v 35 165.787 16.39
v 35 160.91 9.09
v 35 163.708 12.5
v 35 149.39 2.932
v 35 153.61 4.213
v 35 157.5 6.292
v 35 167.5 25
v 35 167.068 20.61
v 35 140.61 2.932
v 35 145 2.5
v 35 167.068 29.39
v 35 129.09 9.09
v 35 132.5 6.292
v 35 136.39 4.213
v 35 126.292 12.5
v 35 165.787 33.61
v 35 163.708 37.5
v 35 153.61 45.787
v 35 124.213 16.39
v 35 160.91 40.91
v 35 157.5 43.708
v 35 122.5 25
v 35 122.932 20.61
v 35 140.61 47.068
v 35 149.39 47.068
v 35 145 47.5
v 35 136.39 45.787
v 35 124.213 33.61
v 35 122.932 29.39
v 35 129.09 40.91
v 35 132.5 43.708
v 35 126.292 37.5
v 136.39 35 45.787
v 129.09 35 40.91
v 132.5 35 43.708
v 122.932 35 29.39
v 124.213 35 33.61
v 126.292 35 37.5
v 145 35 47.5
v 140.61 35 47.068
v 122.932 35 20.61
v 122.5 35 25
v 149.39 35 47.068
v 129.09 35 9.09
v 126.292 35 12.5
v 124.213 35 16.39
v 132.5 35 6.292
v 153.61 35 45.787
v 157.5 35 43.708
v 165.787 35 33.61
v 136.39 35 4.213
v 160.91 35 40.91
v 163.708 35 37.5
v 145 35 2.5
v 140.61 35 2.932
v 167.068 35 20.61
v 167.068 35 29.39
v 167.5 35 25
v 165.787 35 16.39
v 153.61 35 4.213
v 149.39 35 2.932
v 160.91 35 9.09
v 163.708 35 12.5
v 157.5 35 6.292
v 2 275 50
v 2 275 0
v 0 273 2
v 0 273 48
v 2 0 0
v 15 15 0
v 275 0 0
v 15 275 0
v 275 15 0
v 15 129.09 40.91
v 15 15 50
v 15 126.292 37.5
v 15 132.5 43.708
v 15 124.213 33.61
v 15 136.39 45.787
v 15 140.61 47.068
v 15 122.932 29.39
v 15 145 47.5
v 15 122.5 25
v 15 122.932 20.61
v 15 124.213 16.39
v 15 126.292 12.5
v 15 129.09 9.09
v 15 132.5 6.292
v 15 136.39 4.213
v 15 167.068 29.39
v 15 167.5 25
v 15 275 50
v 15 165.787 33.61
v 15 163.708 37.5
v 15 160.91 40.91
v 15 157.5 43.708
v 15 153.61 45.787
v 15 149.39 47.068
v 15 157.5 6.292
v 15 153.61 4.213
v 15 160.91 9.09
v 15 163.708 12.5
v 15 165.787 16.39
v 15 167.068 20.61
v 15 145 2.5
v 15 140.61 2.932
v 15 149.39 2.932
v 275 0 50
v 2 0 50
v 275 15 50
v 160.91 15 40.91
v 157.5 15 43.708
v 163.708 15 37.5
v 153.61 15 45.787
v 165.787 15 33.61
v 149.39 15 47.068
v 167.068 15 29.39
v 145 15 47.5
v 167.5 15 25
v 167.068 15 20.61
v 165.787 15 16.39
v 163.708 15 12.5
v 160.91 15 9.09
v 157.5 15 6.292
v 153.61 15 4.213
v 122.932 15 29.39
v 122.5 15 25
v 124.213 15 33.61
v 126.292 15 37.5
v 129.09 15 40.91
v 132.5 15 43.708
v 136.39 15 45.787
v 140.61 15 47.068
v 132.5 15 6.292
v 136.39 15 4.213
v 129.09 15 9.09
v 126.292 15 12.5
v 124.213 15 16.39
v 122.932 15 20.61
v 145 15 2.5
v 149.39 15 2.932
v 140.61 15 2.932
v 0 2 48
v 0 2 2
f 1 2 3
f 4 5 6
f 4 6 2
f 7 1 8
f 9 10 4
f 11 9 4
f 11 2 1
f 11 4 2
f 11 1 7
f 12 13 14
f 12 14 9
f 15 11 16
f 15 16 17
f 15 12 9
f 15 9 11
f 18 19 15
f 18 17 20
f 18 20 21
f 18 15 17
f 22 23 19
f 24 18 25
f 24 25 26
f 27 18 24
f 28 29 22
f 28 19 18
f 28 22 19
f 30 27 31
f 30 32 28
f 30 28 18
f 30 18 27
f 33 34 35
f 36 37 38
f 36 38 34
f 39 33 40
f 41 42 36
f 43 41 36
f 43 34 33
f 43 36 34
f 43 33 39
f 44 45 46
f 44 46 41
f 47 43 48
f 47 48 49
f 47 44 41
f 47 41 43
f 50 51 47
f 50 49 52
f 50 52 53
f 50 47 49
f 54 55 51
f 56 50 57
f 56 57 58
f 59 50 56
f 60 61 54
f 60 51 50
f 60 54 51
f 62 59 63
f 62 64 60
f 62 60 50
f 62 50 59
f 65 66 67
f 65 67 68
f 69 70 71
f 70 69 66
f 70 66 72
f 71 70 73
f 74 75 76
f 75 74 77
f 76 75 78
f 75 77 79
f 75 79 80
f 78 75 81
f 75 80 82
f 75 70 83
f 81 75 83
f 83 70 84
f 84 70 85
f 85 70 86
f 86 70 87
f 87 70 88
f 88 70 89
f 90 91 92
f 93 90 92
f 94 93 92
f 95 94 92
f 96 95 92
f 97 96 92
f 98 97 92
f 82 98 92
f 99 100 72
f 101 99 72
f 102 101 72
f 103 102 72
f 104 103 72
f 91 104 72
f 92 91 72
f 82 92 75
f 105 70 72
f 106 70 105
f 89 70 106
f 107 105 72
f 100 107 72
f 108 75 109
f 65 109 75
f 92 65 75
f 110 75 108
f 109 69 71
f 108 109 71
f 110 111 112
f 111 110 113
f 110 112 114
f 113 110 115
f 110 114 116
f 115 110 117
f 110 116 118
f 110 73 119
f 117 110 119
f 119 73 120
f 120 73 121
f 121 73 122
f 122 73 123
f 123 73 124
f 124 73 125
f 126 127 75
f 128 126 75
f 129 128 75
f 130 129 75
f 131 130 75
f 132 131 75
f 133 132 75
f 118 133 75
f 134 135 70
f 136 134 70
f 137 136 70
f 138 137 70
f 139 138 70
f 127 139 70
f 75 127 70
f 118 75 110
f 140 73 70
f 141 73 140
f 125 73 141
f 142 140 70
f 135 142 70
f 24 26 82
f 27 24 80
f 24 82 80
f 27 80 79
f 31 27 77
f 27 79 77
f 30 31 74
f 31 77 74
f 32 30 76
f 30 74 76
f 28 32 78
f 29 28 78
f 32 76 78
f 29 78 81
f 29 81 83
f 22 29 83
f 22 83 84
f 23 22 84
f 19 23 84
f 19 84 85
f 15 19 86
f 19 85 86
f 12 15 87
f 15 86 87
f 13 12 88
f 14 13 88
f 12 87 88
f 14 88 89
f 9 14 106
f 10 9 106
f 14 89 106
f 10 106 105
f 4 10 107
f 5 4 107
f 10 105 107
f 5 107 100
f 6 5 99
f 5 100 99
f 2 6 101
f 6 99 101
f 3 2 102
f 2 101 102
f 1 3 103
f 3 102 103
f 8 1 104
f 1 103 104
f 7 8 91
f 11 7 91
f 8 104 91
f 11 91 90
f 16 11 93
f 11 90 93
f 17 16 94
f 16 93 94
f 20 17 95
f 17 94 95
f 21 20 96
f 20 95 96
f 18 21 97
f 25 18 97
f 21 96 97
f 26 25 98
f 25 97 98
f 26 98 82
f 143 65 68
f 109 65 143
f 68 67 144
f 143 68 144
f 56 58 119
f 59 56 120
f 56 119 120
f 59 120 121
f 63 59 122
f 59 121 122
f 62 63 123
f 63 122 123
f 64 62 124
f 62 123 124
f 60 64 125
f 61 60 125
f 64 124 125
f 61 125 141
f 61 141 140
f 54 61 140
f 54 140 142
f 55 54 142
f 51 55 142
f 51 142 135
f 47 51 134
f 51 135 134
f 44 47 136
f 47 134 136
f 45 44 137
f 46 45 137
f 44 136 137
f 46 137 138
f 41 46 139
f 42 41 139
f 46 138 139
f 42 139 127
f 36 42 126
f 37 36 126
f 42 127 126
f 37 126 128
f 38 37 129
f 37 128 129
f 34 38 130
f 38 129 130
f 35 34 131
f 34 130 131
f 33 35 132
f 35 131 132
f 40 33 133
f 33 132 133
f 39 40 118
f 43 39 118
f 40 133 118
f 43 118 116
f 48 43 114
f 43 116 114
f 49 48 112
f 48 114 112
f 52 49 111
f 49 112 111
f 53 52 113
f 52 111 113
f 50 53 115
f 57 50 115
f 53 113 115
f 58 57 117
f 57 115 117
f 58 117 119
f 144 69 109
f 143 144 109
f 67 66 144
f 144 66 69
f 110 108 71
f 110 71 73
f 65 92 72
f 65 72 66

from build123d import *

# Parameters (mm, degrees)
BOSS_EXTRUDE1_DEPTH = 50
SKETCH2_R           = 22.5
BOSS_EXTRUDE2_DEPTH = 20
SKETCH3_R           = 22.5
BOSS_EXTRUDE3_DEPTH = 20
CHAMFER2_SIZE       = 2


with BuildPart() as part:
    # Sketch1 → Boss-Extrude1 (new body)
    with BuildSketch(Plane.XY):
        Polygon((0, 275), (0, 0), (275, 0), (275, 15), (15, 15), (15, 275), align=None)
    extrude(amount=BOSS_EXTRUDE1_DEPTH)

    # Sketch2 → Boss-Extrude2 (add)
    with BuildSketch(Plane(origin=(0, 15, 0), x_dir=(1, 0, 0), z_dir=(0, 1, 0))):
        with Locations((145, -25)):
            Circle(SKETCH2_R)
    extrude(amount=BOSS_EXTRUDE2_DEPTH)

    # Sketch3 → Boss-Extrude3 (add)
    with BuildSketch(Plane(origin=(15, 0, 0), x_dir=(0, 0, -1), z_dir=(1, 0, 0))):
        with Locations(Location((-25, 145, 0), (0, 0, 180))):
            Circle(SKETCH3_R)
    extrude(amount=BOSS_EXTRUDE3_DEPTH)

    # Chamfer2
    chamfer2_edges = [part.edges().sort_by_distance(p)[0] for p in [
        (0, 0, 25),
        (0, 275, 25),
        (0, 137.5, 0),
        (0, 137.5, 50),
    ]]
    chamfer(chamfer2_edges, length=CHAMFER2_SIZE)


solid = part.part
